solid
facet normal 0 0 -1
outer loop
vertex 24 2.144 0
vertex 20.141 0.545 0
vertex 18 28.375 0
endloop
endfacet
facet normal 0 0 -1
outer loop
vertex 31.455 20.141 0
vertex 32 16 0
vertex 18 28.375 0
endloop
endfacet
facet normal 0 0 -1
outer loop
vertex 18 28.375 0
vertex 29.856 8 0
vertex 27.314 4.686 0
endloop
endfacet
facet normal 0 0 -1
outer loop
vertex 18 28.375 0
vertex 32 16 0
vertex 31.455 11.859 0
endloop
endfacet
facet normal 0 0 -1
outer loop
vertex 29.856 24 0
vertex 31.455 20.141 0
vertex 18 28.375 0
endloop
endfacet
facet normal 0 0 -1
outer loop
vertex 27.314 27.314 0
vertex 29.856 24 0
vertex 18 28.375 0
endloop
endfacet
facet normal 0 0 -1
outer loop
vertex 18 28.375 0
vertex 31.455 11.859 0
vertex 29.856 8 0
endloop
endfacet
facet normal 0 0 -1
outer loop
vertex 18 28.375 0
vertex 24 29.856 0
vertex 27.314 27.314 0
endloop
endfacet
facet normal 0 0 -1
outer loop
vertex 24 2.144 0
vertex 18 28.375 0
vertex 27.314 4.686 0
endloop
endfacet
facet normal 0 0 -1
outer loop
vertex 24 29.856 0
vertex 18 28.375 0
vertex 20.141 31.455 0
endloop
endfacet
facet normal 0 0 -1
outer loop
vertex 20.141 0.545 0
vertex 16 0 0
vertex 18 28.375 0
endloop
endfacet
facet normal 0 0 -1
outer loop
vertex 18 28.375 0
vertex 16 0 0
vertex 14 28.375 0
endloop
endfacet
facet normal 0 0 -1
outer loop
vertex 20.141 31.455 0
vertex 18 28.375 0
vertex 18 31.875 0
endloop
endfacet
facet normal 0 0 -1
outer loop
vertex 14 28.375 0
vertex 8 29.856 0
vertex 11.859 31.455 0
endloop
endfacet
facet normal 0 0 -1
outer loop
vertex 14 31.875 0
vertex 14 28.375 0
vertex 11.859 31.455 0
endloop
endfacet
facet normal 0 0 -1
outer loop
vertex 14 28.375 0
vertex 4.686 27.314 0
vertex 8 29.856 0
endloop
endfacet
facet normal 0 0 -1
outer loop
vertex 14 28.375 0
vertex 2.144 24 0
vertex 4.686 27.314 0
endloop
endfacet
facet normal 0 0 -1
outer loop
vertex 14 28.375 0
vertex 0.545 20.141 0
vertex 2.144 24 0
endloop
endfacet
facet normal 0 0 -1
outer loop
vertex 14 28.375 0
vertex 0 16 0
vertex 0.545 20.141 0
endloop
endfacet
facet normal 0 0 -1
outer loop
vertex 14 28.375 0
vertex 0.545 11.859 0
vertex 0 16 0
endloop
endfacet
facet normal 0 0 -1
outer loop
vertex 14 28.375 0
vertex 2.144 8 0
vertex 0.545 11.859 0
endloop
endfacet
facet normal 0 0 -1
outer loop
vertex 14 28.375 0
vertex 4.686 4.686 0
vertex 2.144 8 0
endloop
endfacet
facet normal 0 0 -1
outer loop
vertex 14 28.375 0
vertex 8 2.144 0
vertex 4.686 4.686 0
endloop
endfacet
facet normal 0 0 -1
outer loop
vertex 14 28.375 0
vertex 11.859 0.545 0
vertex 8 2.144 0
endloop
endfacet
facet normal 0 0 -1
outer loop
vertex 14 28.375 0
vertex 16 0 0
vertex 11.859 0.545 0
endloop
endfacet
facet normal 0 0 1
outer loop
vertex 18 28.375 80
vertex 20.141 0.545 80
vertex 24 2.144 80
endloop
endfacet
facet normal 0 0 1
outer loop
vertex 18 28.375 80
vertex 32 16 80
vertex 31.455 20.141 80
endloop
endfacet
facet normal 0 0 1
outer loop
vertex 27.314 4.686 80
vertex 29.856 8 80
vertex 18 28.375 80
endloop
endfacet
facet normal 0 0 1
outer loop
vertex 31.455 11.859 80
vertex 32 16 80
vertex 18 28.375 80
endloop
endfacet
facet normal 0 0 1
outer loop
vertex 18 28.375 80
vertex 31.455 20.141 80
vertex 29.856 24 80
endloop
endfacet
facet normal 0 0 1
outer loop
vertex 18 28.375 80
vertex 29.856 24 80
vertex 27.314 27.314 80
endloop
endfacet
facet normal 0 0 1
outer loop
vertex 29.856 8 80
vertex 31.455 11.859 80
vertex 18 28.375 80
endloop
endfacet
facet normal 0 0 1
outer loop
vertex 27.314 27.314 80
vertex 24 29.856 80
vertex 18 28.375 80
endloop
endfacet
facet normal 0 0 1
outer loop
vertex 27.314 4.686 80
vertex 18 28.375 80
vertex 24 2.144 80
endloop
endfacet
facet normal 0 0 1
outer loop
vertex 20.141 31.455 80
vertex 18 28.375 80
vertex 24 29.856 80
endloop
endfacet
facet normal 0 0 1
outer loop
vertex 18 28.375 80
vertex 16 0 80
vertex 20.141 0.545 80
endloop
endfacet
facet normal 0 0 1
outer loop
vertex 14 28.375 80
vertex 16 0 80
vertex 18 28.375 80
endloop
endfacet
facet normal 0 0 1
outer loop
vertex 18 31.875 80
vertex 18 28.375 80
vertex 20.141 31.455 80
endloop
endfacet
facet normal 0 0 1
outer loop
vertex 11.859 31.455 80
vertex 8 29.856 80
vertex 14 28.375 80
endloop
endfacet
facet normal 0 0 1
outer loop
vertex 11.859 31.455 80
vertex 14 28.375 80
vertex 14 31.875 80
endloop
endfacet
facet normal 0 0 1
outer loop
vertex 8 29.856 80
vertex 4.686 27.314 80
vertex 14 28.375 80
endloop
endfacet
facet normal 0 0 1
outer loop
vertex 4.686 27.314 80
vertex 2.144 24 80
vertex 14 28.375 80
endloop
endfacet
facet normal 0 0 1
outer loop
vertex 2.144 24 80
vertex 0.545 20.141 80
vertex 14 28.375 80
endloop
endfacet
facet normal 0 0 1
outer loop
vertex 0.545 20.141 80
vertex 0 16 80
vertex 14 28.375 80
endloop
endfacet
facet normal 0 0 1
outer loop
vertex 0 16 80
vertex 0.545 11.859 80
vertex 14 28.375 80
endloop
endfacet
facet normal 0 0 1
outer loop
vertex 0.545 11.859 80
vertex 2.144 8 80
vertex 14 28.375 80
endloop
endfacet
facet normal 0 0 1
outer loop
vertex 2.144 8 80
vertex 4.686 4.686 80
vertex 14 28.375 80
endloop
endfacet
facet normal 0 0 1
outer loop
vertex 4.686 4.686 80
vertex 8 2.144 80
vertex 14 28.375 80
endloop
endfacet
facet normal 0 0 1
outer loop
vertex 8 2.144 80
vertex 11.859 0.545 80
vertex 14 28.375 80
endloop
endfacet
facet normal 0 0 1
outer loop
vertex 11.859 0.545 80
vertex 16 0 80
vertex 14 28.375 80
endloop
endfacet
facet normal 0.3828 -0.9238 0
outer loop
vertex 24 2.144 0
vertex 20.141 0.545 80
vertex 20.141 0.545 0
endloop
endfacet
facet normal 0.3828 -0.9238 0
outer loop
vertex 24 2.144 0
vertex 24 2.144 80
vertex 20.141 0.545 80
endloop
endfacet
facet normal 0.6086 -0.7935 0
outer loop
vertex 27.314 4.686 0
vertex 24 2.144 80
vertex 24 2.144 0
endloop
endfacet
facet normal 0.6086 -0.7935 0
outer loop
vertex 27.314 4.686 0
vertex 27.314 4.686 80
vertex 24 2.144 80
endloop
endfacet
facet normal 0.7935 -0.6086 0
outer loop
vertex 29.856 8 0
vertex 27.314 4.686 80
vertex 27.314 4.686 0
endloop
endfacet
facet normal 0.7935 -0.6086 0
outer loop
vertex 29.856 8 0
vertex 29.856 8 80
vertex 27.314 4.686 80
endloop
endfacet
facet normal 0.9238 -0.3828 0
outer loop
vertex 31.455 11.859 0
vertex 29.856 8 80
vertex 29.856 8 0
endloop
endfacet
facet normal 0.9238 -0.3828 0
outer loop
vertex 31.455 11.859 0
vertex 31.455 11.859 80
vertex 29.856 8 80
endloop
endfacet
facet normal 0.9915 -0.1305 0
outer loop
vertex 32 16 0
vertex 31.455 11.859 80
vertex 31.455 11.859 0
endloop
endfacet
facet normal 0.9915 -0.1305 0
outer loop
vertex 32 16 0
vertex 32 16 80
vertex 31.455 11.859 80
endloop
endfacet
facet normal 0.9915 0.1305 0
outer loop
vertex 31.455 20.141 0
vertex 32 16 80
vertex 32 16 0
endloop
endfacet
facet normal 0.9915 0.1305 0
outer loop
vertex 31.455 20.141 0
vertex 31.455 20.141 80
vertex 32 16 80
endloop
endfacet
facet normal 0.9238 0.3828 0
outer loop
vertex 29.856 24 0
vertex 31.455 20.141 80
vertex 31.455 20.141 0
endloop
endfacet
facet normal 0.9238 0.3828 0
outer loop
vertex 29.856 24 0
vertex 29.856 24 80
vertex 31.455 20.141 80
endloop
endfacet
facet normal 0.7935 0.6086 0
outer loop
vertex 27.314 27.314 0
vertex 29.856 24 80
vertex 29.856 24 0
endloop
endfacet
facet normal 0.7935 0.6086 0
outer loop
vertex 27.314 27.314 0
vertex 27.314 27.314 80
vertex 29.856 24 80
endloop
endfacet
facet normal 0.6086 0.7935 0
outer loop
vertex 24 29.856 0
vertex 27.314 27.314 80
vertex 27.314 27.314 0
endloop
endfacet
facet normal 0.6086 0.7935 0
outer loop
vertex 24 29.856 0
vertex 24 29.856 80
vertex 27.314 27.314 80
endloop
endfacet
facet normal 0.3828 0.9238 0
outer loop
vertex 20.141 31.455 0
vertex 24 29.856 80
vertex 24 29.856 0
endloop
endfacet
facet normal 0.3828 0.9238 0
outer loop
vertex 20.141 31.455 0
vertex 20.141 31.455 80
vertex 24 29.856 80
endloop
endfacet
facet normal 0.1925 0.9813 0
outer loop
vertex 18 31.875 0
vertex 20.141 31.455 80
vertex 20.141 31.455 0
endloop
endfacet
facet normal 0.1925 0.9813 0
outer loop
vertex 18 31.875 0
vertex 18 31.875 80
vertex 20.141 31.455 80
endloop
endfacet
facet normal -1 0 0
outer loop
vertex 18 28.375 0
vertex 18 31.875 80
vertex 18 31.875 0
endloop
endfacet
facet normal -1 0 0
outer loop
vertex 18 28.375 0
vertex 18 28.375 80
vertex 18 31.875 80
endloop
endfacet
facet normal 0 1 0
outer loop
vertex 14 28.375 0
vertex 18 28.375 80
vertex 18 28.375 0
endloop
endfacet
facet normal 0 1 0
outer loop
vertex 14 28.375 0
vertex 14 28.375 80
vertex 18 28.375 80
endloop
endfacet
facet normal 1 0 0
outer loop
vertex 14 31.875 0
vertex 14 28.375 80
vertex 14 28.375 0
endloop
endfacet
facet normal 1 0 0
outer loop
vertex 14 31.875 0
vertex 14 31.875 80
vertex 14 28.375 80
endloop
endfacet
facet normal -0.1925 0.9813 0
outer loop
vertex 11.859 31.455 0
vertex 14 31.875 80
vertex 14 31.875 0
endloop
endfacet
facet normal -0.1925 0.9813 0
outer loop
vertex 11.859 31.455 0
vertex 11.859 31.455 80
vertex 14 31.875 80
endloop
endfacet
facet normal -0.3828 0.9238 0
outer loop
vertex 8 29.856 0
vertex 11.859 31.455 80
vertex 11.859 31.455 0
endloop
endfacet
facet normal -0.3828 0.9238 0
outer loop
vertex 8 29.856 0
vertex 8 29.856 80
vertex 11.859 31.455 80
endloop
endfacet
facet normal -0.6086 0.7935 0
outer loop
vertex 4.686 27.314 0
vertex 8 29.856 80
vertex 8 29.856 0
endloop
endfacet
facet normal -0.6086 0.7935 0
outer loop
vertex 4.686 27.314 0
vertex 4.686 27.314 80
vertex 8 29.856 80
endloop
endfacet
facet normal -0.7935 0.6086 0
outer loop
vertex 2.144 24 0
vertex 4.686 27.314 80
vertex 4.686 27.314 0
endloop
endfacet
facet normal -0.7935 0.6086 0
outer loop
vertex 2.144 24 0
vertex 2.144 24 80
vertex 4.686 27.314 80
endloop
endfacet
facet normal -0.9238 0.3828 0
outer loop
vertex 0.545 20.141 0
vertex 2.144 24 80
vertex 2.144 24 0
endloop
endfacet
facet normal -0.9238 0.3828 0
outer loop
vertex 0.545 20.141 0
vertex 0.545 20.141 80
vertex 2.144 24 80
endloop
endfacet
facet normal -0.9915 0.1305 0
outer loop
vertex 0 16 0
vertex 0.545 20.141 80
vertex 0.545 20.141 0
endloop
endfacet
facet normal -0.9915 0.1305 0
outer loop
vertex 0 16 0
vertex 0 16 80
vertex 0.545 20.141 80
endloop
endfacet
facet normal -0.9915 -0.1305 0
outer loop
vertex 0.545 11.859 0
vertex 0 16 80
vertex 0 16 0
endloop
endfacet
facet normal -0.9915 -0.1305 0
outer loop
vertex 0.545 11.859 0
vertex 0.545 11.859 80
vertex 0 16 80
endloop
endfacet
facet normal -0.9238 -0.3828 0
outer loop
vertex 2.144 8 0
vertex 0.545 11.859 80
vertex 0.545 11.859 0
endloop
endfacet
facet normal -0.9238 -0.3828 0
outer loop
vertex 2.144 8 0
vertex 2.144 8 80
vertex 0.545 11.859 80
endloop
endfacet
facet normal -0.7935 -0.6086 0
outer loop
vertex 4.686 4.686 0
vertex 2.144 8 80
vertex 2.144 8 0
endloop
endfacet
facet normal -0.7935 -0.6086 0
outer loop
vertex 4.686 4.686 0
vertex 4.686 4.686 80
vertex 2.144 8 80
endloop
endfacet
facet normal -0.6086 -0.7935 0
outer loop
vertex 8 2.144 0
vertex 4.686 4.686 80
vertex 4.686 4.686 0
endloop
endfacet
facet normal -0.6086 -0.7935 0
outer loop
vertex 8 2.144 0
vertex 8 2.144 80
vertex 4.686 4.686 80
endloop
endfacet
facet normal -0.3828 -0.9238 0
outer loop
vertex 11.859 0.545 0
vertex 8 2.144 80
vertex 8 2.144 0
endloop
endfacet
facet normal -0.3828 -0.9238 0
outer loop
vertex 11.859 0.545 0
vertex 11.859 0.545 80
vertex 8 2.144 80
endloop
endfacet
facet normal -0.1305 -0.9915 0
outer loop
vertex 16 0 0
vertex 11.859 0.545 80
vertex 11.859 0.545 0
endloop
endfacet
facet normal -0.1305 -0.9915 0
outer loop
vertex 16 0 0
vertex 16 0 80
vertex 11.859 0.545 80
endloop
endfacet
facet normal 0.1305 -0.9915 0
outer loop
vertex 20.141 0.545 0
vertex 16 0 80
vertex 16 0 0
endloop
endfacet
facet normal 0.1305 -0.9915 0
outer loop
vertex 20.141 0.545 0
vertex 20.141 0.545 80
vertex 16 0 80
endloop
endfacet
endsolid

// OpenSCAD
$fn = 32;

// ----------------------------------------------------------------------
// Keyway shaft: d32 shaft, key 4 x 3.5 mm
// ----------------------------------------------------------------------

// --- parameters (mm) ---
shaft_r = 16;             // shaft radius
key_w = 4;                // keyway width
key_d = 3.5;              // keyway depth below the surface line
plate_t = 80;             // shaft length, Z (extrusion height)

shaft_d = 2 * shaft_r;  // shaft diameter
circle_step = 15;  // polygon sampling step, degrees

profile = [[11.859, 31.455], [8, 29.856], [4.686, 27.314], [2.144, 24], [0.545, 20.141], [0, 16], [0.545, 11.859], [2.144, 8], [4.686, 4.686], [8, 2.144], [11.859, 0.545], [16, 0], [20.141, 0.545], [24, 2.144], [27.314, 4.686], [29.856, 8], [31.455, 11.859], [32, 16], [31.455, 20.141], [29.856, 24], [27.314, 27.314], [24, 29.856], [20.141, 31.455], [18, 31.875], [18, 28.375], [14, 28.375], [14, 31.875]];  // primary outline, 27 points, counter clockwise

// --- the one profile operation ---
linear_extrude(height = plate_t) polygon(points = profile);
